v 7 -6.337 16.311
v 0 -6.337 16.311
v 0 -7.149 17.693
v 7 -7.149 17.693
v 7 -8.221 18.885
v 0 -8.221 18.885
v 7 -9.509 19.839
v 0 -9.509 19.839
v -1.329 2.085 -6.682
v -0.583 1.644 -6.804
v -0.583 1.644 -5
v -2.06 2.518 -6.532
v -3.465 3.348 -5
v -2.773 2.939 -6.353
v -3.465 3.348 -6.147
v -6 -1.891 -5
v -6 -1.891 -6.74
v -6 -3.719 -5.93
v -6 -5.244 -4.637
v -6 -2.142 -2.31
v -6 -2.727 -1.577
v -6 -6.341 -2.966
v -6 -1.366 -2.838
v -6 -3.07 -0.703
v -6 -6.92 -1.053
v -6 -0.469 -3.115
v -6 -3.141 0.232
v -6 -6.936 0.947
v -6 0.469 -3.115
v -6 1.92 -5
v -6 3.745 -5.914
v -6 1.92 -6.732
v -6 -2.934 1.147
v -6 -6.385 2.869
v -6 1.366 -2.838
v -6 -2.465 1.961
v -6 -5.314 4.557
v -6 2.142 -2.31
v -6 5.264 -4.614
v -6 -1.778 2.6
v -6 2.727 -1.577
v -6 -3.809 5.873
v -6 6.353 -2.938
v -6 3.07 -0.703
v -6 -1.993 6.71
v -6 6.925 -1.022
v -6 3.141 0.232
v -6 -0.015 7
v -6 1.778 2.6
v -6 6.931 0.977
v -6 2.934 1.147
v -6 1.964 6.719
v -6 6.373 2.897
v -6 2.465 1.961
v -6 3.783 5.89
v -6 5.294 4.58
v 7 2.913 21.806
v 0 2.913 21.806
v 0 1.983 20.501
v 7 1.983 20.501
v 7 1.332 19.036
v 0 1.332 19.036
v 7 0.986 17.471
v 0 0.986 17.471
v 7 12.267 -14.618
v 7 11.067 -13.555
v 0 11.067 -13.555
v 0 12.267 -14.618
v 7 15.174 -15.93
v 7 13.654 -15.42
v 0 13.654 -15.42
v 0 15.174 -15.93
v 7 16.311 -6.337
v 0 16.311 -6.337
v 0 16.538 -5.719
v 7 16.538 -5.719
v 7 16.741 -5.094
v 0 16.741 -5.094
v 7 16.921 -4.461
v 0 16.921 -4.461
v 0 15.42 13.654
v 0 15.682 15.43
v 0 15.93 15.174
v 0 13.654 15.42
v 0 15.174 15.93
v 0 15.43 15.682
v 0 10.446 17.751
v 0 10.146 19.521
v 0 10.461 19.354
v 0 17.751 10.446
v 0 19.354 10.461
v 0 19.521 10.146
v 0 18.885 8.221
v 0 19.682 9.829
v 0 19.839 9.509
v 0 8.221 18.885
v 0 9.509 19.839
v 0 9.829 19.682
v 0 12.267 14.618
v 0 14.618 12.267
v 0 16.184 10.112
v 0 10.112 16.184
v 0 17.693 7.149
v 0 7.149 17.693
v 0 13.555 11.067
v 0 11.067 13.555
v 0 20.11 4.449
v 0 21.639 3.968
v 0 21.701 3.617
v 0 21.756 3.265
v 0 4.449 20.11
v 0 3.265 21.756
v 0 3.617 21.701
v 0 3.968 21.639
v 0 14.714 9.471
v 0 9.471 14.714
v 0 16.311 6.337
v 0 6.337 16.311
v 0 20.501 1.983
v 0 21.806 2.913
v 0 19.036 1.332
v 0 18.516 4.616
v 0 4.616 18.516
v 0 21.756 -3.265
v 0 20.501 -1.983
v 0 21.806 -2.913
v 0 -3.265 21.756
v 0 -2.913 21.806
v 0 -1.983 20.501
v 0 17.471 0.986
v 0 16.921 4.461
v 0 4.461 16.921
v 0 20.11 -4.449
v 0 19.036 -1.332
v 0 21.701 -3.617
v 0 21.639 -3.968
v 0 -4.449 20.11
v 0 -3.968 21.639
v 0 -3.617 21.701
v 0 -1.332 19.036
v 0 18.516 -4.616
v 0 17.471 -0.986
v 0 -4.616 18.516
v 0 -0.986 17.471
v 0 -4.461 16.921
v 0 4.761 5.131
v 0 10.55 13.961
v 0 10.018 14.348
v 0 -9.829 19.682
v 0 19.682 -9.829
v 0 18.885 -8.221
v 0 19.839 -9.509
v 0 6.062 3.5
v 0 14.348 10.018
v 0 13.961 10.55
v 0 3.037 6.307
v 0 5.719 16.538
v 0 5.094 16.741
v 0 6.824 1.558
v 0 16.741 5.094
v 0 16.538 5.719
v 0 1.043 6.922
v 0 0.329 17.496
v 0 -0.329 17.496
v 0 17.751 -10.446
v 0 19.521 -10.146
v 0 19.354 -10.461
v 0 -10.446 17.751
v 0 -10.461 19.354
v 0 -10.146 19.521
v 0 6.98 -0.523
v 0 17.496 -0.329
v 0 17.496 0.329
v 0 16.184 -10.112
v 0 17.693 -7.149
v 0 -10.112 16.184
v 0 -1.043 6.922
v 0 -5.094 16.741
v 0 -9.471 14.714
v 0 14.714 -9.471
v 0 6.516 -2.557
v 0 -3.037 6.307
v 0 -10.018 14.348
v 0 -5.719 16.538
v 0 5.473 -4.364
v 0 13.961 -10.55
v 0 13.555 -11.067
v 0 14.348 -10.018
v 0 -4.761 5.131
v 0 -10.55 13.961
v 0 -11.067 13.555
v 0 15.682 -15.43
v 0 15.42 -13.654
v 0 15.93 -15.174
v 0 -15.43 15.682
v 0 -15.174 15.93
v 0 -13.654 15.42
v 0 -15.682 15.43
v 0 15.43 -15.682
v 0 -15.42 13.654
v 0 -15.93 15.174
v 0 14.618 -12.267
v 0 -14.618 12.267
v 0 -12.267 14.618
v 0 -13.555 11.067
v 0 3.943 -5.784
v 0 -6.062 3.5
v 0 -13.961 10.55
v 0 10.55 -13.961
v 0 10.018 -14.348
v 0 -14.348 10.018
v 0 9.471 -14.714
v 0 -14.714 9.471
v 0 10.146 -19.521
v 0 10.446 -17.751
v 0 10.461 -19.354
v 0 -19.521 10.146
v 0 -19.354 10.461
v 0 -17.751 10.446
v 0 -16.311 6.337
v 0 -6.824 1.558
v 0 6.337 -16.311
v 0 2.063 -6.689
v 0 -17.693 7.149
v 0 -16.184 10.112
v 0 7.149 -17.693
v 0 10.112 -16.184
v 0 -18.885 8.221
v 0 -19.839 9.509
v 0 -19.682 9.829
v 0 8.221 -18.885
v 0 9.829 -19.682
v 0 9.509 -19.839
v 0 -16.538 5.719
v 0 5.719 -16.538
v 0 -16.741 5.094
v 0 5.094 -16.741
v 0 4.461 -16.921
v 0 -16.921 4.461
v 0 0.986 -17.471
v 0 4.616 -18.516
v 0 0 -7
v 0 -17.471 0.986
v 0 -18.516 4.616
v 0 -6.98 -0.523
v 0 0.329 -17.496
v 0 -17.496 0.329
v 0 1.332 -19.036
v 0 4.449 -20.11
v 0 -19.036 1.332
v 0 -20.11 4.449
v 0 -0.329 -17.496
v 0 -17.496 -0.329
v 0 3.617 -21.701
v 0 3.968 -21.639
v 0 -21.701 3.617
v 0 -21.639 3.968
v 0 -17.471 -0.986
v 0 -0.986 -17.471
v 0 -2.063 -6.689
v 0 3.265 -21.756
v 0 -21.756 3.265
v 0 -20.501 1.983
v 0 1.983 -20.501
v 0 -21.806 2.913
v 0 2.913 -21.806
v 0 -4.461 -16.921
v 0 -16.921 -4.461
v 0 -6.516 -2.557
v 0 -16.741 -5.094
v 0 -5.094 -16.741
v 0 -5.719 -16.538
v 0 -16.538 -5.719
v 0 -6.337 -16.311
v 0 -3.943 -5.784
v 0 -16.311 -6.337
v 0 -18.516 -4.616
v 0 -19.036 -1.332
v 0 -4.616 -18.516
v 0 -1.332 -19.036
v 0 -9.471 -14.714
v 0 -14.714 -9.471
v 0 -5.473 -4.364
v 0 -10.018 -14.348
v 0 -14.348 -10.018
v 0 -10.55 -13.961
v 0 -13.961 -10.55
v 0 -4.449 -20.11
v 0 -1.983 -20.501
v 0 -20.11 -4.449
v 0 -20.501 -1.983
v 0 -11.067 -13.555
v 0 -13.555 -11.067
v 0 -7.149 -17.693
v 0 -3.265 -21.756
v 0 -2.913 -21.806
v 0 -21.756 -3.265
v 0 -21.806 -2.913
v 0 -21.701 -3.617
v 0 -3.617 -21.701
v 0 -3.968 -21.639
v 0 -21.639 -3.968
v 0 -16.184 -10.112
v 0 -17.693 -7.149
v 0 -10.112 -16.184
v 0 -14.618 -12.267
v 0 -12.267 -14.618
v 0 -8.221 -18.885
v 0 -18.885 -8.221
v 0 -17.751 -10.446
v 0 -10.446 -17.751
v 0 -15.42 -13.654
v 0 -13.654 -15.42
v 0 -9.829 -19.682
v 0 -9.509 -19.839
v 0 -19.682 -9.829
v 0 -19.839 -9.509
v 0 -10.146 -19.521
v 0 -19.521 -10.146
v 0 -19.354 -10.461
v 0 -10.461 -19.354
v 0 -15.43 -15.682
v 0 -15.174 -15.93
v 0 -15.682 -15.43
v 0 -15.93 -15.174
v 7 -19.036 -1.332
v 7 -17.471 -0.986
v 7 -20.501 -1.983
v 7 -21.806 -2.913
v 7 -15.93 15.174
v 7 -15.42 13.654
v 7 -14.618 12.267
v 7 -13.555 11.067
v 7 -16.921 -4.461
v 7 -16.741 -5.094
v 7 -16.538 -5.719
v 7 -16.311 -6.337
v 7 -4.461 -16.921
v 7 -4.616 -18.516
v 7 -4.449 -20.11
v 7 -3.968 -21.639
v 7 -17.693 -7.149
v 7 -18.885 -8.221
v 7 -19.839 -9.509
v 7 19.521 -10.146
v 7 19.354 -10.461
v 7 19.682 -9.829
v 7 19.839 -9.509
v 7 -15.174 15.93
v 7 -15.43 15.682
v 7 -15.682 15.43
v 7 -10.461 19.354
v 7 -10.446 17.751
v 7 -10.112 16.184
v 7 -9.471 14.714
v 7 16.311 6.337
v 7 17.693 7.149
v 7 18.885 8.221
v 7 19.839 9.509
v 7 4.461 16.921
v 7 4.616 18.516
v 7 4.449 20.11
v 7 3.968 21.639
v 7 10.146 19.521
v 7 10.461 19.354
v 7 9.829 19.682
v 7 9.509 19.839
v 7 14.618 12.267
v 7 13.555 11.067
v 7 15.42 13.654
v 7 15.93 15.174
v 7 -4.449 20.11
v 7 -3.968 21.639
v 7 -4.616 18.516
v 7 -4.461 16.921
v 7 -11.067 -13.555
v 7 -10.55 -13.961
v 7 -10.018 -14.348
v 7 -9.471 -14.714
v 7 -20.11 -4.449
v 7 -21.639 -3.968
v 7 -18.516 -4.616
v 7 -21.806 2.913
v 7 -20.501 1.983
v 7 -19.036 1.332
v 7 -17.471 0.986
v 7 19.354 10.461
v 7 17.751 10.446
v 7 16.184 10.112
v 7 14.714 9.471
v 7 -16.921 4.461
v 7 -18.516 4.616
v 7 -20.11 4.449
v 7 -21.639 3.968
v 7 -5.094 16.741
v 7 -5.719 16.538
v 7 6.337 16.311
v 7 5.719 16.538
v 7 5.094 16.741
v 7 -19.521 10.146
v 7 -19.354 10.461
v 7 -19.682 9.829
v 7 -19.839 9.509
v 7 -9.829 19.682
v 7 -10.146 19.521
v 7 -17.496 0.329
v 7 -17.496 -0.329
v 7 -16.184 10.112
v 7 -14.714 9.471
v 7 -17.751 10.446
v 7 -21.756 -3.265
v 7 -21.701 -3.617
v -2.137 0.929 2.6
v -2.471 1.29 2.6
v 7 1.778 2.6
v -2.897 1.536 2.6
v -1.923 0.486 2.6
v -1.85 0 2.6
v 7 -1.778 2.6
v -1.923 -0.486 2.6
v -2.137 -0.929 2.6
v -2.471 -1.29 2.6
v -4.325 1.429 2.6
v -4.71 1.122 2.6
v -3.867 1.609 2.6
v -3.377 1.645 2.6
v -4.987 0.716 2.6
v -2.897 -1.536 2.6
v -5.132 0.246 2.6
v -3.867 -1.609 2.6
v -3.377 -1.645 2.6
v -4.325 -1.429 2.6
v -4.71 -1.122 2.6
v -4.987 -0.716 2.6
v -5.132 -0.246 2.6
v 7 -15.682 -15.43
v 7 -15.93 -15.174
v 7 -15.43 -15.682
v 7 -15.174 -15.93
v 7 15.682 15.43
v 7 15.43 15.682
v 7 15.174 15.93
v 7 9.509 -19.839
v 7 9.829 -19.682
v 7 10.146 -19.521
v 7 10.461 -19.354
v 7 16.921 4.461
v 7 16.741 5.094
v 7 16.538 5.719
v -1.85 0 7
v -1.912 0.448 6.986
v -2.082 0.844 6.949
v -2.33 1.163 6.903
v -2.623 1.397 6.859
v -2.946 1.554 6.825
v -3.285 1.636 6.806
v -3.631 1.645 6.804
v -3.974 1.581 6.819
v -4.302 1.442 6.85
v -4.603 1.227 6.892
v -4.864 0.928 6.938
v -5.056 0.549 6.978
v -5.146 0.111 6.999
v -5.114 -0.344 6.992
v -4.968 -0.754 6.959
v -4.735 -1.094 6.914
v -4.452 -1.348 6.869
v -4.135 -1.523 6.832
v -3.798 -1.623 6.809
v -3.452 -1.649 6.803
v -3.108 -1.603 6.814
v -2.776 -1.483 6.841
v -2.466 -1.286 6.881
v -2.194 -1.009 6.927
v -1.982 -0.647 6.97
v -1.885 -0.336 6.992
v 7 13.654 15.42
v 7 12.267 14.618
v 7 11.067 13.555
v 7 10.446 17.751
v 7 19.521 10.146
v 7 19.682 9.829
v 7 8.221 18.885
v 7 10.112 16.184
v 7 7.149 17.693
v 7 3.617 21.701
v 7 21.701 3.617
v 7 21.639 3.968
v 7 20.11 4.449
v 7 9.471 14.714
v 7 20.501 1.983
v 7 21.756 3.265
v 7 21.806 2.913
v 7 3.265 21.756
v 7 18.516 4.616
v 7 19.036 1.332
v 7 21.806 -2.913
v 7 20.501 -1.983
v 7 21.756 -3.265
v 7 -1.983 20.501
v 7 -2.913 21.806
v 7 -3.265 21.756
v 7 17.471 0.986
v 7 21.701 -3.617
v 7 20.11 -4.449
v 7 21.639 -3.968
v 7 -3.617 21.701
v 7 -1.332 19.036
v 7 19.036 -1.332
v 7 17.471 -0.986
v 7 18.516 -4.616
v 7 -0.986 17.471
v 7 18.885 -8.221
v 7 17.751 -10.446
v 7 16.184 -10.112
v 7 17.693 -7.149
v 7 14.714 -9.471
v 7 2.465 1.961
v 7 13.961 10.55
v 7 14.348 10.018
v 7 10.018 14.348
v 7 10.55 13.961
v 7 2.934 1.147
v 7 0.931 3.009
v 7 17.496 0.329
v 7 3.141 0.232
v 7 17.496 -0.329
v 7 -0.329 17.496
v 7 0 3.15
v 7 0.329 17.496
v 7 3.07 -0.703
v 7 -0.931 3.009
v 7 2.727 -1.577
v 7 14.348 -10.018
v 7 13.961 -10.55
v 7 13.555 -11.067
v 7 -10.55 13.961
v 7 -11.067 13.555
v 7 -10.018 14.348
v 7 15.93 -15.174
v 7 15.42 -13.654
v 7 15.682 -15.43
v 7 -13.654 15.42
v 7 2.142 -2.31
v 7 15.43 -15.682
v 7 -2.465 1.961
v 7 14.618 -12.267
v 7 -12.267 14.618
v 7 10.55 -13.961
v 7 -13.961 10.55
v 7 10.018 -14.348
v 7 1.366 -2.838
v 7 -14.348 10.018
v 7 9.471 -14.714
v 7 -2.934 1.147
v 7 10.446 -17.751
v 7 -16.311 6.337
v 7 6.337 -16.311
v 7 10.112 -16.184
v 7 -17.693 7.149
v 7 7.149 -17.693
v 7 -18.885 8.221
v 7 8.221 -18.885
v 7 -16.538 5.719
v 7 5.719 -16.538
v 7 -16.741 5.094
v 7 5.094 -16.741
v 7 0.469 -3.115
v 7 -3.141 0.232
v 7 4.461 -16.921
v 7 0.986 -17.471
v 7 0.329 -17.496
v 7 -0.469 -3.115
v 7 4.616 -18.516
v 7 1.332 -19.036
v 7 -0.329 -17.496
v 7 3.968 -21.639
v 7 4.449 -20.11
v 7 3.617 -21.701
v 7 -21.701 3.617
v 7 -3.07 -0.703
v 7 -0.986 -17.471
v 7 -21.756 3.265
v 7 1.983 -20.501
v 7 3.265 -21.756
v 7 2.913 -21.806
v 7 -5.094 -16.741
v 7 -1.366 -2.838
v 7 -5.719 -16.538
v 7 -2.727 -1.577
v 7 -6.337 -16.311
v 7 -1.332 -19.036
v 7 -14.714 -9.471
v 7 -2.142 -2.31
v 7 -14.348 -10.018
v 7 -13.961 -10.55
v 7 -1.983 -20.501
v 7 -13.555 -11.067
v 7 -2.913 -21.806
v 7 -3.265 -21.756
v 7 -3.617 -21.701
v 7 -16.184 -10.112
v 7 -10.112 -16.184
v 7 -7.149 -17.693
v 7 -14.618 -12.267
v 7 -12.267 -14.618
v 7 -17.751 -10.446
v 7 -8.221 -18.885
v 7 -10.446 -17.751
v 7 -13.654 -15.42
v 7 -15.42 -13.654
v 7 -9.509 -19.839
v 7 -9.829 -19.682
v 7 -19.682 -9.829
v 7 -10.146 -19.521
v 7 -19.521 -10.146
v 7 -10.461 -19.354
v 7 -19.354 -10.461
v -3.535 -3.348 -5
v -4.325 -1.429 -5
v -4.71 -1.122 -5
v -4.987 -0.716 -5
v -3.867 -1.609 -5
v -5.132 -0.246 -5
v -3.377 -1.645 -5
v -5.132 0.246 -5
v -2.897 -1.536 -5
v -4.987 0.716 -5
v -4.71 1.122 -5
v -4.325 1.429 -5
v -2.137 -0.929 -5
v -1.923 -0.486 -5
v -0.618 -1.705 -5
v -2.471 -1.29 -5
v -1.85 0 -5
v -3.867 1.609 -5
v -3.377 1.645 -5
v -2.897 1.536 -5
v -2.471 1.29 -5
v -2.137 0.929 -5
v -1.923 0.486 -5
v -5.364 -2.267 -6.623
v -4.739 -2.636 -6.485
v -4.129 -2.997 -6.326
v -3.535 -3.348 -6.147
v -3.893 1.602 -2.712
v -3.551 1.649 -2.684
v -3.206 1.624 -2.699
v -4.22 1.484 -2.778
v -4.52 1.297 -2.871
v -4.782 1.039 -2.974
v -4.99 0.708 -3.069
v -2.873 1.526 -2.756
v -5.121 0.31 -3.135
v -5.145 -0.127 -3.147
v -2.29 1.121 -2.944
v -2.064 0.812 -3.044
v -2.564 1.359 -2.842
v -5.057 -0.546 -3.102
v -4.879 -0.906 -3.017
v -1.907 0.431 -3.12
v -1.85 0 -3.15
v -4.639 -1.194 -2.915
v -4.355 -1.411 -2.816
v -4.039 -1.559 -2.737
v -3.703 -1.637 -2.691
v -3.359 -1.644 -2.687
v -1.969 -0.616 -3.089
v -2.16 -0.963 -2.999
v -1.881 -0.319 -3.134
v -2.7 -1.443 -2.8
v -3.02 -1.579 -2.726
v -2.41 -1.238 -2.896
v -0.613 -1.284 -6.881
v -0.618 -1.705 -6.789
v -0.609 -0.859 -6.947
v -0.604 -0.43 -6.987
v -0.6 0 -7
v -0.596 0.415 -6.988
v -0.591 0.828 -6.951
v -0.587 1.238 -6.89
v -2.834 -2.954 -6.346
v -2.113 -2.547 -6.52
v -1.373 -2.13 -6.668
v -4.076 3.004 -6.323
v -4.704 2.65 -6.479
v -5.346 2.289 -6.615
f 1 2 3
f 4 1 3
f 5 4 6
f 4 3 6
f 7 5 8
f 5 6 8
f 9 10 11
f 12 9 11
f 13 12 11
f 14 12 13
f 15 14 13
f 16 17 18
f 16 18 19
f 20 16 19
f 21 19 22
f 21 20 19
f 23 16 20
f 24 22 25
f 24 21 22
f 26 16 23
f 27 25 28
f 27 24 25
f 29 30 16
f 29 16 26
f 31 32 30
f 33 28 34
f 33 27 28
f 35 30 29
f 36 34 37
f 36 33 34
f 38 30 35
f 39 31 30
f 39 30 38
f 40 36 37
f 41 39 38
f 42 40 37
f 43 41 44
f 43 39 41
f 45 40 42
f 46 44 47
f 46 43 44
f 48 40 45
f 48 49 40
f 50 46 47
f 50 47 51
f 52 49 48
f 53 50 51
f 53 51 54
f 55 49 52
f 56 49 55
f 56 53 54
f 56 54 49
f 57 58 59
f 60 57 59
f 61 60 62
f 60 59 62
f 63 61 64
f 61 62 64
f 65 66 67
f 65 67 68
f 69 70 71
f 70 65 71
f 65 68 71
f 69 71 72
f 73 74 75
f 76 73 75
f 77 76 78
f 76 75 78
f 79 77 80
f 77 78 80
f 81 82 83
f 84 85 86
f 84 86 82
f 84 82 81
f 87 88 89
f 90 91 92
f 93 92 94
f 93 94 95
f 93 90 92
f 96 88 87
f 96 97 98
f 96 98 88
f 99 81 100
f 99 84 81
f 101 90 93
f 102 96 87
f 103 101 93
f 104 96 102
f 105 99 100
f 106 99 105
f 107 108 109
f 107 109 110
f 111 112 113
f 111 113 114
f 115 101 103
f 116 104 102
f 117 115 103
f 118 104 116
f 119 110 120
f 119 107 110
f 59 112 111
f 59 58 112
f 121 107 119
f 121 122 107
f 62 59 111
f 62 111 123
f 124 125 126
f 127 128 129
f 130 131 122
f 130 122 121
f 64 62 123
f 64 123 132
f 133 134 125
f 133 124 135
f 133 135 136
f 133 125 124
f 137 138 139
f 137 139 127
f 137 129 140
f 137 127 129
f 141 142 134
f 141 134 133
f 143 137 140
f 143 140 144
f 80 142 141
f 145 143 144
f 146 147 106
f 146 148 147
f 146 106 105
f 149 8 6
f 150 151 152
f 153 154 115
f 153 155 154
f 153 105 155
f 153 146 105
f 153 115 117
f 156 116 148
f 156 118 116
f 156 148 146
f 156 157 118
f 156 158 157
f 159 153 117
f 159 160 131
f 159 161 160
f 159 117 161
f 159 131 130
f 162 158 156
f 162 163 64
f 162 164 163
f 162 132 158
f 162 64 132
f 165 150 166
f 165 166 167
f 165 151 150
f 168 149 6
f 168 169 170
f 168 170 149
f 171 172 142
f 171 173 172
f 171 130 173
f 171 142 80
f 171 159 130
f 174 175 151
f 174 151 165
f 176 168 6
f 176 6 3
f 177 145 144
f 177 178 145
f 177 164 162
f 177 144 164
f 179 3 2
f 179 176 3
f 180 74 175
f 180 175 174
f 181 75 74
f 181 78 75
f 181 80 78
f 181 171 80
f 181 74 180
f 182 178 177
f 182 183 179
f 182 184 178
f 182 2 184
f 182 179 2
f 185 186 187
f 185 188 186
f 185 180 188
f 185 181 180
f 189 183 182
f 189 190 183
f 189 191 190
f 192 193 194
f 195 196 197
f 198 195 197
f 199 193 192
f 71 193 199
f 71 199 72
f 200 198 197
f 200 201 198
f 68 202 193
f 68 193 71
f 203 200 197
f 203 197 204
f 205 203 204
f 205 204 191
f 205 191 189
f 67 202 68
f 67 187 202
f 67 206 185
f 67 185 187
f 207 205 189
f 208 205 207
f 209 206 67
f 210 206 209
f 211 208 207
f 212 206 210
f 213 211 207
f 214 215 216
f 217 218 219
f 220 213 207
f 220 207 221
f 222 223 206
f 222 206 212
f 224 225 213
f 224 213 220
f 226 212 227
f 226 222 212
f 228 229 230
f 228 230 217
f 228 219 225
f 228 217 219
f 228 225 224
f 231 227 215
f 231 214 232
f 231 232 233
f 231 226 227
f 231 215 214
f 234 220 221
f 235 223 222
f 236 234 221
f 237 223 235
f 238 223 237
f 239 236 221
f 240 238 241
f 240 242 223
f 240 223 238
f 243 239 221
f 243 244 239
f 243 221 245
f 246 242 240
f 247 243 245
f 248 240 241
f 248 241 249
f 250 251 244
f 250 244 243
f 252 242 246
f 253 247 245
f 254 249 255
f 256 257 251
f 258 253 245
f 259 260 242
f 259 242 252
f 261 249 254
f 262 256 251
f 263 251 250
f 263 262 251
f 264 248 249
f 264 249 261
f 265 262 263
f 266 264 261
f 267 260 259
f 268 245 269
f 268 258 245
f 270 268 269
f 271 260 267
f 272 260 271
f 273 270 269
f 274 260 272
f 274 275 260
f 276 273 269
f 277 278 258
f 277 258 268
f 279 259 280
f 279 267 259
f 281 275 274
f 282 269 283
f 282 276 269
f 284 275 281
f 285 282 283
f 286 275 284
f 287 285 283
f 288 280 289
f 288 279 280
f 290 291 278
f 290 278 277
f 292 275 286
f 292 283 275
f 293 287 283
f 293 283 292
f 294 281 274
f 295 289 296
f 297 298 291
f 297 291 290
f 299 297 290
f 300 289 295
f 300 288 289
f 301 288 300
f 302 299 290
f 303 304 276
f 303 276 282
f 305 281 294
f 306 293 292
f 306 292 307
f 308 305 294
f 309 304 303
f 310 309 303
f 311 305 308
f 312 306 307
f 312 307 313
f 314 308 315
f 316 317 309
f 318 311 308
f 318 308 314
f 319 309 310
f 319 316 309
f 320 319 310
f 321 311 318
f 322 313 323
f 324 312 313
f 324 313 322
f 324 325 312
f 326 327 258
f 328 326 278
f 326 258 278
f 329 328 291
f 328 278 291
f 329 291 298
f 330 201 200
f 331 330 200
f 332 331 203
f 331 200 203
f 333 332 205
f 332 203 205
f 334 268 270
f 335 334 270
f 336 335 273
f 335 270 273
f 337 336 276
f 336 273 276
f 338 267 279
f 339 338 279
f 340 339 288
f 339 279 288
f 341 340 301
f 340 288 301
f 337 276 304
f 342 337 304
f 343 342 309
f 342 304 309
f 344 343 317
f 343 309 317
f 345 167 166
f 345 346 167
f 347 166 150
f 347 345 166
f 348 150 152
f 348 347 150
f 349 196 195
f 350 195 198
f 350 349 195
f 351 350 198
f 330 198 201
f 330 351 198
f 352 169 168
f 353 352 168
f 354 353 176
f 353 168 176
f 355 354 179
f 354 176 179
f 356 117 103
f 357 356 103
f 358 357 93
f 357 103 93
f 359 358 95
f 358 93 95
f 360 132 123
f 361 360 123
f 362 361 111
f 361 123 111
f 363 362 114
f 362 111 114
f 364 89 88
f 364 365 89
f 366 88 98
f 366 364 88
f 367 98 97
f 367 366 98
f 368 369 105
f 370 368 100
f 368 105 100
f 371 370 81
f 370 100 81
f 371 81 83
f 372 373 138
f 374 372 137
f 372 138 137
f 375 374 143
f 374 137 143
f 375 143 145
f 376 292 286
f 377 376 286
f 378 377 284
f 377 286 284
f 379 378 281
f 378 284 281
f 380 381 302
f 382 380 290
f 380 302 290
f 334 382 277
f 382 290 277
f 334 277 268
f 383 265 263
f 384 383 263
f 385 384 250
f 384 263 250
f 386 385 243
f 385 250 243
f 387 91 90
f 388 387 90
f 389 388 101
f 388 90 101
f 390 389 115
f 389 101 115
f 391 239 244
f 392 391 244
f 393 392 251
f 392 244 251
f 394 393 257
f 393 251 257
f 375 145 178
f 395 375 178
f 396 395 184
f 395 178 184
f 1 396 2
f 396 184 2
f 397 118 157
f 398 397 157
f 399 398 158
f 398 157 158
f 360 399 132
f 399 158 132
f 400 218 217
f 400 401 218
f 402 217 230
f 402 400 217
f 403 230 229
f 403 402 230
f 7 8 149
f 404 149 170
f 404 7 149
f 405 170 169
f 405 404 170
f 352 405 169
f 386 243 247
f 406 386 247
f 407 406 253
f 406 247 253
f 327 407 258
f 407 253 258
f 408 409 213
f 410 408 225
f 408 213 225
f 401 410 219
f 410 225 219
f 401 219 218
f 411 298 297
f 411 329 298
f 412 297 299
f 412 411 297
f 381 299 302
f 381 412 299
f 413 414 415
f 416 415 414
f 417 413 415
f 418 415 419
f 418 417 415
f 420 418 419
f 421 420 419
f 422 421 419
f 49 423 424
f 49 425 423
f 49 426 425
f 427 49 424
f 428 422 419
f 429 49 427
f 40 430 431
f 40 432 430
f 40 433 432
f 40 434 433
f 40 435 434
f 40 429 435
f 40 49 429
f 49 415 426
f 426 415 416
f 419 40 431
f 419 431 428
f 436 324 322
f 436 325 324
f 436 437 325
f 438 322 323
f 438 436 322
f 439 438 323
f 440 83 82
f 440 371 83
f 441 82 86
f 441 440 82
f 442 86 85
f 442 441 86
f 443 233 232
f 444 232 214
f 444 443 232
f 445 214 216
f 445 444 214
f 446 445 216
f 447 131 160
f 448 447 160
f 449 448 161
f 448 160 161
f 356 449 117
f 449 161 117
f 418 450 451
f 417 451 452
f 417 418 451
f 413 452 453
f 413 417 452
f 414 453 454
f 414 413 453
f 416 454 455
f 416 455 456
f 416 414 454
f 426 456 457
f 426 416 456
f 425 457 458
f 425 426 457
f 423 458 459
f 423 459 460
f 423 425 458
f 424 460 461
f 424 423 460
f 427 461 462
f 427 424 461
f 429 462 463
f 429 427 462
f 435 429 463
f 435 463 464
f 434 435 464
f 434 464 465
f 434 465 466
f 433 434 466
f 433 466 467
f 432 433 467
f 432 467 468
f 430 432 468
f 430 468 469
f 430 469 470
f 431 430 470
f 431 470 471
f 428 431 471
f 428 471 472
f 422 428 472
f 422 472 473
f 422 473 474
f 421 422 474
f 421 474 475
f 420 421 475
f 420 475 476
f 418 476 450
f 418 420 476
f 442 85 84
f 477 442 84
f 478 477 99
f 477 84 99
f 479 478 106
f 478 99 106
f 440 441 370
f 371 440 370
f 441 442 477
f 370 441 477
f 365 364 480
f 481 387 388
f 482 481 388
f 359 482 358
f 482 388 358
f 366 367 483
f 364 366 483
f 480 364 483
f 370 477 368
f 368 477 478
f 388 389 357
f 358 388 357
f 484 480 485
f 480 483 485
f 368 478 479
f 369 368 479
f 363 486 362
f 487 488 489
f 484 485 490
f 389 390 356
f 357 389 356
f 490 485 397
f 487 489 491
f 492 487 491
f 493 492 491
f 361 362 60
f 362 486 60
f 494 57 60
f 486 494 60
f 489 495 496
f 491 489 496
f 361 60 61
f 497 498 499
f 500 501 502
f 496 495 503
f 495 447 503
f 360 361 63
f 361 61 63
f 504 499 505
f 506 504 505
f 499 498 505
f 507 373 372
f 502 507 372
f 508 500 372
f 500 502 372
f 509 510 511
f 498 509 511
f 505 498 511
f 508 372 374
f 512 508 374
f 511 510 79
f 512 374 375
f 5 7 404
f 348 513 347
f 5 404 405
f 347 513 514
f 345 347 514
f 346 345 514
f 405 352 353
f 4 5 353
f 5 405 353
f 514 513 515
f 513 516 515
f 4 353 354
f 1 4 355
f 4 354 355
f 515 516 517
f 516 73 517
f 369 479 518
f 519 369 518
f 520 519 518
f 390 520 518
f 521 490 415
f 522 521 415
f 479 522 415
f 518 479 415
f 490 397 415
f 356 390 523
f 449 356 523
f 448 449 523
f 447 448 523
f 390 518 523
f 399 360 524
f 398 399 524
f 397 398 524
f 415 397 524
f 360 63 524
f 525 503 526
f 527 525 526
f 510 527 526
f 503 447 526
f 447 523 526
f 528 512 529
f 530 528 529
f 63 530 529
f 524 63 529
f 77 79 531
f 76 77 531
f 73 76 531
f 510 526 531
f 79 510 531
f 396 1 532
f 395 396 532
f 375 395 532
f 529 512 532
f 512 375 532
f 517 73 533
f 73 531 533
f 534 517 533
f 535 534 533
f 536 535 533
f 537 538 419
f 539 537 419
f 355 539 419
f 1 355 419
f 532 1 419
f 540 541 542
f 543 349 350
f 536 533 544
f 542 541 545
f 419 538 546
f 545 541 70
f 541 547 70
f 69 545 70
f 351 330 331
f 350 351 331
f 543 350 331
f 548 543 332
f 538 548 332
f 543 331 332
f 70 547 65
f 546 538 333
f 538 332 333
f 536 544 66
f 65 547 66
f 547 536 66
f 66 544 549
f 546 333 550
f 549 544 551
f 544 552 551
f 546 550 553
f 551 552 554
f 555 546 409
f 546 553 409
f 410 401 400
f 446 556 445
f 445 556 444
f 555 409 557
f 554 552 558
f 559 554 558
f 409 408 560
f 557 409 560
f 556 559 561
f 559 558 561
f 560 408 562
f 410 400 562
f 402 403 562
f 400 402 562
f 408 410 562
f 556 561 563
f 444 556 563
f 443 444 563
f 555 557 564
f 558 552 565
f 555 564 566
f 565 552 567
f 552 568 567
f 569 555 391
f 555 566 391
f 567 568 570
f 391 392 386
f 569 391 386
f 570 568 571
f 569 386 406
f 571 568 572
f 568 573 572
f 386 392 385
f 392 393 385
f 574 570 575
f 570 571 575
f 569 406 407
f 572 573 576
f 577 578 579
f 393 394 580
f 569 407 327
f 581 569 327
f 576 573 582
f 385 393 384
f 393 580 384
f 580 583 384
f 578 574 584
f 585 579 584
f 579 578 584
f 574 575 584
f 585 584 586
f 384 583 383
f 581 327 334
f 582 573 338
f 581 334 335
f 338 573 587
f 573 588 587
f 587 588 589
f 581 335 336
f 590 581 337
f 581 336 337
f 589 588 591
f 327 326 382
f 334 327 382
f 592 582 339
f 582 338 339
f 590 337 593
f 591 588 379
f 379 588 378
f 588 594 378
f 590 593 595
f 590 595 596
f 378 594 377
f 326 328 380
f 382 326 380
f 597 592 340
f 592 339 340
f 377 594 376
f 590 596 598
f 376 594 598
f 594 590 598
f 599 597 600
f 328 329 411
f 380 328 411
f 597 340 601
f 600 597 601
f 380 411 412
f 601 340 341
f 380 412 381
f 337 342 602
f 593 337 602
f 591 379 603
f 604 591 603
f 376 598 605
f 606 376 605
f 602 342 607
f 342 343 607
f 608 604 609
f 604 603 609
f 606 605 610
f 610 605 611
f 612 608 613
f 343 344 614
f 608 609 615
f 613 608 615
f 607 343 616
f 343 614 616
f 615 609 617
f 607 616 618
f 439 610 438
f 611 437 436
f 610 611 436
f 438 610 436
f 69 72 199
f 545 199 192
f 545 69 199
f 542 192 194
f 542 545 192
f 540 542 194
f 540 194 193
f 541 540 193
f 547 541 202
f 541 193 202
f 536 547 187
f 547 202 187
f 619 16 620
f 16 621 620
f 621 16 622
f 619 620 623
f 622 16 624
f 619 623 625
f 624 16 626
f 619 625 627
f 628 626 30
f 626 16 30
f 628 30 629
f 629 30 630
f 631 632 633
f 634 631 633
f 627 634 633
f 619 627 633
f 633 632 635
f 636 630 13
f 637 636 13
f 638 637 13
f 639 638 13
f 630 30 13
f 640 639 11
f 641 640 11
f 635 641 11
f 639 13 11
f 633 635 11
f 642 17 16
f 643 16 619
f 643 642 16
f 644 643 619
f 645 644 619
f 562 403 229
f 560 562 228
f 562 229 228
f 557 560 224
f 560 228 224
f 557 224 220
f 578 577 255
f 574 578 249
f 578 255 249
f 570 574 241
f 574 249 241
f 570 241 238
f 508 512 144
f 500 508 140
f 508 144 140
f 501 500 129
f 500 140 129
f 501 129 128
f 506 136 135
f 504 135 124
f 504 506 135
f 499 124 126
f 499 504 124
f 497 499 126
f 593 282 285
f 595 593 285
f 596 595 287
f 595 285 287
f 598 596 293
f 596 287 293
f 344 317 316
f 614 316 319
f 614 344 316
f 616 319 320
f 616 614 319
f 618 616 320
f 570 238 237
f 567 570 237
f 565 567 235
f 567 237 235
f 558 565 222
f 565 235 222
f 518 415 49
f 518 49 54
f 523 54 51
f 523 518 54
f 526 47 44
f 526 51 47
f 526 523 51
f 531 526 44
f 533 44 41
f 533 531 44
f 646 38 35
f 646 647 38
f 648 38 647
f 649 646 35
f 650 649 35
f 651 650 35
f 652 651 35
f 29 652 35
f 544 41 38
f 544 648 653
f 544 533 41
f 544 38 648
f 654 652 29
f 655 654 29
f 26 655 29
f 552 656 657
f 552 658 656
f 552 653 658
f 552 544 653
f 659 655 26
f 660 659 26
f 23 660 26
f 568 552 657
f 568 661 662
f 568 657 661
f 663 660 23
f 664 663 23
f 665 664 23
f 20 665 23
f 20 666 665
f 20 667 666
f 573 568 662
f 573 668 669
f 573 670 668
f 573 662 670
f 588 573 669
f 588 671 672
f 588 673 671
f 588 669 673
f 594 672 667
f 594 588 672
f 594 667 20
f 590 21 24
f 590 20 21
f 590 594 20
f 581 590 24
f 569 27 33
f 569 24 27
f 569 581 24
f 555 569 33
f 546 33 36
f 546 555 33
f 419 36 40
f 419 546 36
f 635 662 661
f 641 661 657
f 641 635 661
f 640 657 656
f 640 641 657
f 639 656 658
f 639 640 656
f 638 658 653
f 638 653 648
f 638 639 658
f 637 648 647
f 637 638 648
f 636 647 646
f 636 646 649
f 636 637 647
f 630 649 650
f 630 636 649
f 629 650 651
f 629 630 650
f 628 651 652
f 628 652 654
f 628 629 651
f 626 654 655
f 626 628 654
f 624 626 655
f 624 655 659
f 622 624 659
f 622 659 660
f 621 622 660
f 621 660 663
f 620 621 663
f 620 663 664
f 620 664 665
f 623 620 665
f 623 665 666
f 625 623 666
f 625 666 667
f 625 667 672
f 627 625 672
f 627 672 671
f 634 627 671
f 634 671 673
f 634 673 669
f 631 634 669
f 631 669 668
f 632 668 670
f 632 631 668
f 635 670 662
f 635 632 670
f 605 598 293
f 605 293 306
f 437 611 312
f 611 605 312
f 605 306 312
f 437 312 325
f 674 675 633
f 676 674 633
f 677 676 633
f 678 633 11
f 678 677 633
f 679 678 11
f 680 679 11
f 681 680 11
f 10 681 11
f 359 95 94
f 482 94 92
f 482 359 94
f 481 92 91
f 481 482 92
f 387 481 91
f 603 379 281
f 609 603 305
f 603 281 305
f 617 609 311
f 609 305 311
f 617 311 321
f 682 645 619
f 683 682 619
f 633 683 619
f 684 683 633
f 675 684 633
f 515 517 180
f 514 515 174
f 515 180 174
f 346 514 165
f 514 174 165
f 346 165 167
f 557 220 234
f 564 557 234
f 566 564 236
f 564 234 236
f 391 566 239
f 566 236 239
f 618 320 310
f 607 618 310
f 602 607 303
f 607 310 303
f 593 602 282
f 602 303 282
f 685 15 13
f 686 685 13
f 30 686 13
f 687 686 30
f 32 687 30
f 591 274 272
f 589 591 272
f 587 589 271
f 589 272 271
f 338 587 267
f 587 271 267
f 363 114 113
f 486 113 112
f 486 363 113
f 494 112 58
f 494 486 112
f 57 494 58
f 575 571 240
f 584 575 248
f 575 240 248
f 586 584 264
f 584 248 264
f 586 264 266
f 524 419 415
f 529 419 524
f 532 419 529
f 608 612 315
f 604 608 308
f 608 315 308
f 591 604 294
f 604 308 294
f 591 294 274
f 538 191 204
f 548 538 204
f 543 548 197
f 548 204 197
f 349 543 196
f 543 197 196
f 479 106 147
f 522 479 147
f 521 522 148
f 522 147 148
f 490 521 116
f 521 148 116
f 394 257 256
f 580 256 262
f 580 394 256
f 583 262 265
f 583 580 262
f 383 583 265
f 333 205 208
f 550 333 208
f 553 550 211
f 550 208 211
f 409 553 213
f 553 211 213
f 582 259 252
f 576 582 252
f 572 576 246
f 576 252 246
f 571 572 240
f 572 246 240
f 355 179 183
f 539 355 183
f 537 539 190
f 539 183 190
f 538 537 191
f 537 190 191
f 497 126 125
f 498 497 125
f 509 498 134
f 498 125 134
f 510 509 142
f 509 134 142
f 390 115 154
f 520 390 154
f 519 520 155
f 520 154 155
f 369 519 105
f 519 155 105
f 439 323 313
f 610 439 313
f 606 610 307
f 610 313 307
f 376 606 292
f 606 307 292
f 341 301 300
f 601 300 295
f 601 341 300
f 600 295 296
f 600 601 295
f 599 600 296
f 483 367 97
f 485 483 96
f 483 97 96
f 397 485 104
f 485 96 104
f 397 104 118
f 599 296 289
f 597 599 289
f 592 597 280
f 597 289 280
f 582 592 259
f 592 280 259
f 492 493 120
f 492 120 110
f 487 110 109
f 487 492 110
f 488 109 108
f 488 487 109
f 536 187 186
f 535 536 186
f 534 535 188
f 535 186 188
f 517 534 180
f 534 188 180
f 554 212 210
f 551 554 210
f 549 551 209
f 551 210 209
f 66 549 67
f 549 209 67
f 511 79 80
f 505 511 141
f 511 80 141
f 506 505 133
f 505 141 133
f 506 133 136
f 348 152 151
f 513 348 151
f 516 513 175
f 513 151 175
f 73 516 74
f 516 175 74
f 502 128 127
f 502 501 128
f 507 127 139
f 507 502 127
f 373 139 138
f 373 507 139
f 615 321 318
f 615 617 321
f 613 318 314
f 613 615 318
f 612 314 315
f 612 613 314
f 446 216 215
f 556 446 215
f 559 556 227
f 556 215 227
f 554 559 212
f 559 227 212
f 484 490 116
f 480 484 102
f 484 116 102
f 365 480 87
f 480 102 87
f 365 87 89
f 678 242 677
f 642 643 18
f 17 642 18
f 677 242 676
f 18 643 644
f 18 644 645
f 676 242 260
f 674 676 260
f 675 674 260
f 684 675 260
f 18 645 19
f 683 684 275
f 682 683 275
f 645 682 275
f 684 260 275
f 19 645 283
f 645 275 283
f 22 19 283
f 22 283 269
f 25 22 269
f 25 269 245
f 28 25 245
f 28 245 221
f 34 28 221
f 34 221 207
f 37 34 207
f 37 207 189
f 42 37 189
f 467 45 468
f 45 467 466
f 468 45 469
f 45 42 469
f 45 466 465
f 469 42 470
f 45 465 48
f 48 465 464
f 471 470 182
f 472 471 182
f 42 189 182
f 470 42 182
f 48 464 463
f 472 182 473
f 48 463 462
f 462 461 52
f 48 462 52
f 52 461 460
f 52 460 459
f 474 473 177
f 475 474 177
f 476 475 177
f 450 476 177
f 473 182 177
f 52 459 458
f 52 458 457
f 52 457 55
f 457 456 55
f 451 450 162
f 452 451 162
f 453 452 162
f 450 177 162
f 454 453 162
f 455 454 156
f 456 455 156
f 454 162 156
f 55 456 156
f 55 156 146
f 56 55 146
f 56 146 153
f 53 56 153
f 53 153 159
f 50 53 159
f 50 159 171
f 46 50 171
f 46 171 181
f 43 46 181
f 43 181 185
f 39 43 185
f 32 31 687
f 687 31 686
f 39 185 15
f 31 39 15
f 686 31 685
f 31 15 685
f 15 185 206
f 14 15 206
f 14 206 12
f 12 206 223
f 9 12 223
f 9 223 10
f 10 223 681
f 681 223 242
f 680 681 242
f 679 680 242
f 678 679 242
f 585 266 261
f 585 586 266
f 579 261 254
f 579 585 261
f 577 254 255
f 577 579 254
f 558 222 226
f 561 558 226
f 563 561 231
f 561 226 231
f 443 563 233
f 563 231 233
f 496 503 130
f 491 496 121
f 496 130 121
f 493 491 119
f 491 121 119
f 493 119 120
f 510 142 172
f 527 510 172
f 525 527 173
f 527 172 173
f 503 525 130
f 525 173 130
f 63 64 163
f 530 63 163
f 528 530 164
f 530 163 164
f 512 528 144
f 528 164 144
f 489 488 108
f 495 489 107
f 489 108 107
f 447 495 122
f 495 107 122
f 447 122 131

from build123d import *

# Parameters (mm, degrees)
BASPROSKE_W              = 7
BASPROSKE_H              = 22
TOOTHCUT_DEPTH           = 32.890437438
TEETHCUTS_COUNT          = 20
TEETHCUTS_ANGLE          = 342
HUBNEAONESKE_R           = 7
HUBNEARONE_DEPTH         = 6.0000508
BORSKE_R                 = 3
BORE_DEPTH               = 13.0000508
CUT_EXTRUDE_3_DEPTH      = 34.466904857
CUT_EXTRUDE_3_DEPTH_BACK = 34.466904857
SKETCH_4_R               = 3.15
EXTRUDE_1_DEPTH          = 13.000051
CUT_EXTRUDE_4_DEPTH      = 32.623288929
CUT_EXTRUDE_4_DEPTH_BACK = 32.623288929
SKETCH_2_R               = 1.65
CUT_EXTRUDE_5_DEPTH      = 2


with BuildPart() as part:
    # BasProSke → Base-Revolve (revolve)
    with BuildSketch(Plane(origin=(0, 0, 0), x_dir=(1, 0, 0), z_dir=(0, 1, 0)), mode=Mode.PRIVATE) as base_revolve_sk:
        with Locations((3.5, 11)):
            Rectangle(BASPROSKE_W, BASPROSKE_H)
    revolve(base_revolve_sk.sketch.rotate(Axis((-10, 0, 0), (1, 0, 0)), 180), axis=Axis((-10, 0, 0), (1, 0, 0)))

    # TooCutSke → ToothCut (cut, through all)
    with BuildSketch(Plane(origin=(0, 0, 0), x_dir=(0, 0, -1), z_dir=(1, 0, 0))):
        with BuildLine():
            ThreePointArc((0.986171591, 17.471189616), (0, 17.499), (-0.986171591, 17.471189616))
            ThreePointArc((-0.986171591, 17.471189616), (-1.626916196, 19.798789858), (-2.932850173, 21.829260982))
            ThreePointArc((-2.932850173, 21.829260982), (0, 22.0254), (2.932850173, 21.829260982))
            ThreePointArc((2.932850173, 21.829260982), (1.626916196, 19.798789858), (0.986171591, 17.471189616))
        make_face()
    toothcut = extrude(amount=TOOTHCUT_DEPTH, mode=Mode.SUBTRACT)

    # TeethCuts: ToothCut ×20 about axis
    teethcuts_axis = Axis((-10, 0, 0), (1, 0, 0))
    for i in range(1, TEETHCUTS_COUNT):
        add(toothcut.rotate(teethcuts_axis, i * TEETHCUTS_ANGLE / (TEETHCUTS_COUNT - 1)), mode=Mode.SUBTRACT)

    # HubNeaOneSke → HubNearOne (add)
    with BuildSketch(Plane.ZY):
        with Locations(Location((0, 0, 0), (0, 0, 180))):
            Circle(HUBNEAONESKE_R)
    extrude(amount=HUBNEARONE_DEPTH)

    # BorSke → Bore (cut, symmetric)
    with BuildSketch(Plane(origin=(0, 0, 0), x_dir=(0, 0, -1), z_dir=(1, 0, 0))):
        with Locations(Location((0, 0, 0), (0, 0, 180))):
            Circle(BORSKE_R)
    extrude(amount=BORE_DEPTH, both=True, mode=Mode.SUBTRACT)

    # 草图4 → 切除-拉伸3 (cut, two sides: drawn at the far end of the back side and taken through both)
    with BuildSketch(Plane.ZY.offset(6.0000508).offset(-CUT_EXTRUDE_3_DEPTH_BACK)):
        Circle(SKETCH_4_R)
    extrude(amount=CUT_EXTRUDE_3_DEPTH + CUT_EXTRUDE_3_DEPTH_BACK, mode=Mode.SUBTRACT)

    # 草图1 → 凸台-拉伸1 (add, through all)
    with BuildSketch(Plane.ZY.offset(6.0000508)):
        with BuildLine():
            Line((2.6, 1.778341924), (2.6, -1.778341924))
            ThreePointArc((2.6, -1.778341924), (3.15, 0), (2.6, 1.778341924))
        make_face()
    extrude(amount=-EXTRUDE_1_DEPTH)

    # 草图2 → 切除-拉伸4 (cut, two sides: drawn at the far end of the back side and taken through both)
    with BuildSketch(Plane.XY.offset(-CUT_EXTRUDE_4_DEPTH_BACK)):
        with Locations((-3.5000508, 0)):
            Circle(SKETCH_2_R)
    extrude(amount=CUT_EXTRUDE_4_DEPTH + CUT_EXTRUDE_4_DEPTH_BACK, mode=Mode.SUBTRACT)

    # 草图5 → 切除-拉伸5 (cut)
    with BuildSketch(Plane.XY.offset(-7)):
        Polygon((-6.382322544, 1.704653316), (-6.417459749, -1.643793892), (-3.535188005, -3.348447209), (-0.617779056, -1.704653316), (-0.582641851, 1.643793892), (-3.464913595, 3.348447209), align=None)
    extrude(amount=CUT_EXTRUDE_5_DEPTH, mode=Mode.SUBTRACT)


solid = part.part
